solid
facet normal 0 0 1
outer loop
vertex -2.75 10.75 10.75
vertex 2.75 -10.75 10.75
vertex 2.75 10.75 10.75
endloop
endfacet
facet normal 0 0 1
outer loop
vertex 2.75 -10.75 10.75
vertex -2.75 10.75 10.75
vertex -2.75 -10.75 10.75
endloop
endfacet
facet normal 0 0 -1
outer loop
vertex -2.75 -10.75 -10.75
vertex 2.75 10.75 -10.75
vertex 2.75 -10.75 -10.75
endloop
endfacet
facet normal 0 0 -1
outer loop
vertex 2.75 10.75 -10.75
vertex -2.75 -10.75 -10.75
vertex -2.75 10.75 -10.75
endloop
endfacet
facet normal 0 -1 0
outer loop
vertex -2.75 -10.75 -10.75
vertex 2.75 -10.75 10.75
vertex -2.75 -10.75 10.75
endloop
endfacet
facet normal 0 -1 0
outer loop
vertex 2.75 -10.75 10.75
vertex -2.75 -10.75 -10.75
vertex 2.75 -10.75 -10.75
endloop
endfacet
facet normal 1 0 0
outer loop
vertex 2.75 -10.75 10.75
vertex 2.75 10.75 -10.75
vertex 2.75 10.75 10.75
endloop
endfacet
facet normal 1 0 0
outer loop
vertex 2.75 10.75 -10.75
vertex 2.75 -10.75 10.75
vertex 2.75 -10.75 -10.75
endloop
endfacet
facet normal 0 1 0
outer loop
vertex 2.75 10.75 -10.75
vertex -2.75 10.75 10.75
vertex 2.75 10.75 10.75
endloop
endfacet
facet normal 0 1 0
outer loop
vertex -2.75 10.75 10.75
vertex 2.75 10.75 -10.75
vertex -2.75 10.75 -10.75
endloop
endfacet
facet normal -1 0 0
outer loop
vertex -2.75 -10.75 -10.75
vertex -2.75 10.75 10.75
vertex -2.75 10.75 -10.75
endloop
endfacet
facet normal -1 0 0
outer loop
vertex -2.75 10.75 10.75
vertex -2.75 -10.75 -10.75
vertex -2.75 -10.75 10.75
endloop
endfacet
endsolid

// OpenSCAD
// file: 3dprinter.scad
//BioDeploy SCAD file = 3dprinter.scad


//choose the max specs for your 3d printer
//here we use a replicator2x specs

x_print_max = 25*10;
y_print_max = 15.2*10;
z_print_max = 15.5*10;

//don't forget *10 to put in centimeters
// file: generator_variables.scad
//===============================================//
//===============================================//
// BioDeploy SCAD file = generator_variables.scad//
//                 Start File                    //
//===============================================//
//===============================================//
//-----------------------------------------------//
include <3dprinter.scad>
//===============================================//
//                   variables                   //
//===============================================//
//===============================================//
pad = 0.1; //padding
//choose the spec for your generator
//===============================================//
//                    magnets1                   //
//===============================================//
//Volume :
x_magnet = 5.5;
y_magnet = 21.5;
z_magnet = 21.5;
//Number of magnets on the rotor :
nbmagnetsonrotor = 16;
rotor_ext_max = 60;
//===============================================//
//                    magnets2                   //
//===============================================//
//Volume :
diam_magnet2 = 35;
z_magnet2 = 5;
//Number of magnets on the rotor :
nbmagnetsonrotor2 = 6;
//===============================================//
//                      rotor                    //
//===============================================//
smooth_rotor = 100;
smooth_bobine = 100;
z_rotor_int = 20;
//===============================================//
//                  adapter_rotor                //
//===============================================//
diam_adapter_max = 32 ;
diam_adapter_min = 25.15 ;
h_adapter = 7;
h_adapter_box = 12;
nbarm = 6;
//===============================================//
//                    Bobine1                    //
//===============================================//
r_bobine_ext_max = y_magnet/2;
r_bobine_ext_min = 4.5;
r_bobine_int = 3.5;

x_bobine = 30;
p_bobine_ext = 1;

r_bobine2_ext_min = 3.4;
r_bobine2_int = 2.5;

wire_in = 1;
wire_out = 1;


//===============================================//
//                    Protector                  //
//===============================================//

r_bobine_protector_ext_max = y_magnet/2 + 1.5;
gap_bobine_protector = (r_bobine_protector_ext_max - r_bobine_ext_max)/2;


x_bobine_protector=x_bobine+1.5;

smooth_protector = 100;

//===============================================//
//                    Socle1                     //
//===============================================//

r_socle_int = 0;
r_socle_ext = 0;
position_bobine_in = 0;
position_bobine_out = 0;
connector_socle_female =0;
connector_socle_male =0;
space_marge=3;

//-----------------------------------------------//
//===============================================//
//===============================================//
// BioDeploy SCAD file = generator_variables.scad//
//                   End  File                   //
//===============================================//
//===============================================//
// main file
//===============================================//
//===============================================//
//  BioDeploy SCAD file = generator_magnet.scad  //
//                 Start File                    //
//===============================================//
//===============================================//
//-----------------------------------------------//

//===============================================//
//                   variables                   //
//===============================================//
include <generator_variables.scad>
//===============================================//
//               Calls for use                   //
//===============================================//
//use <generator_logo.scad>
//===============================================//
//                    Trees                      //
//===============================================//
module magnet()
{cube([x_magnet,y_magnet,z_magnet], center = true);}
magnet();

//%cube([x_h2o_cont_ext,y_h2o_cont_ext,z_h2o_cont_ext], center=true);
//-----------------------------------------------//
//===============================================//
//===============================================//
//  BioDeploy SCAD file = generator_magnet.scad  //
//                   End  File                   //
//===============================================//
//===============================================//
